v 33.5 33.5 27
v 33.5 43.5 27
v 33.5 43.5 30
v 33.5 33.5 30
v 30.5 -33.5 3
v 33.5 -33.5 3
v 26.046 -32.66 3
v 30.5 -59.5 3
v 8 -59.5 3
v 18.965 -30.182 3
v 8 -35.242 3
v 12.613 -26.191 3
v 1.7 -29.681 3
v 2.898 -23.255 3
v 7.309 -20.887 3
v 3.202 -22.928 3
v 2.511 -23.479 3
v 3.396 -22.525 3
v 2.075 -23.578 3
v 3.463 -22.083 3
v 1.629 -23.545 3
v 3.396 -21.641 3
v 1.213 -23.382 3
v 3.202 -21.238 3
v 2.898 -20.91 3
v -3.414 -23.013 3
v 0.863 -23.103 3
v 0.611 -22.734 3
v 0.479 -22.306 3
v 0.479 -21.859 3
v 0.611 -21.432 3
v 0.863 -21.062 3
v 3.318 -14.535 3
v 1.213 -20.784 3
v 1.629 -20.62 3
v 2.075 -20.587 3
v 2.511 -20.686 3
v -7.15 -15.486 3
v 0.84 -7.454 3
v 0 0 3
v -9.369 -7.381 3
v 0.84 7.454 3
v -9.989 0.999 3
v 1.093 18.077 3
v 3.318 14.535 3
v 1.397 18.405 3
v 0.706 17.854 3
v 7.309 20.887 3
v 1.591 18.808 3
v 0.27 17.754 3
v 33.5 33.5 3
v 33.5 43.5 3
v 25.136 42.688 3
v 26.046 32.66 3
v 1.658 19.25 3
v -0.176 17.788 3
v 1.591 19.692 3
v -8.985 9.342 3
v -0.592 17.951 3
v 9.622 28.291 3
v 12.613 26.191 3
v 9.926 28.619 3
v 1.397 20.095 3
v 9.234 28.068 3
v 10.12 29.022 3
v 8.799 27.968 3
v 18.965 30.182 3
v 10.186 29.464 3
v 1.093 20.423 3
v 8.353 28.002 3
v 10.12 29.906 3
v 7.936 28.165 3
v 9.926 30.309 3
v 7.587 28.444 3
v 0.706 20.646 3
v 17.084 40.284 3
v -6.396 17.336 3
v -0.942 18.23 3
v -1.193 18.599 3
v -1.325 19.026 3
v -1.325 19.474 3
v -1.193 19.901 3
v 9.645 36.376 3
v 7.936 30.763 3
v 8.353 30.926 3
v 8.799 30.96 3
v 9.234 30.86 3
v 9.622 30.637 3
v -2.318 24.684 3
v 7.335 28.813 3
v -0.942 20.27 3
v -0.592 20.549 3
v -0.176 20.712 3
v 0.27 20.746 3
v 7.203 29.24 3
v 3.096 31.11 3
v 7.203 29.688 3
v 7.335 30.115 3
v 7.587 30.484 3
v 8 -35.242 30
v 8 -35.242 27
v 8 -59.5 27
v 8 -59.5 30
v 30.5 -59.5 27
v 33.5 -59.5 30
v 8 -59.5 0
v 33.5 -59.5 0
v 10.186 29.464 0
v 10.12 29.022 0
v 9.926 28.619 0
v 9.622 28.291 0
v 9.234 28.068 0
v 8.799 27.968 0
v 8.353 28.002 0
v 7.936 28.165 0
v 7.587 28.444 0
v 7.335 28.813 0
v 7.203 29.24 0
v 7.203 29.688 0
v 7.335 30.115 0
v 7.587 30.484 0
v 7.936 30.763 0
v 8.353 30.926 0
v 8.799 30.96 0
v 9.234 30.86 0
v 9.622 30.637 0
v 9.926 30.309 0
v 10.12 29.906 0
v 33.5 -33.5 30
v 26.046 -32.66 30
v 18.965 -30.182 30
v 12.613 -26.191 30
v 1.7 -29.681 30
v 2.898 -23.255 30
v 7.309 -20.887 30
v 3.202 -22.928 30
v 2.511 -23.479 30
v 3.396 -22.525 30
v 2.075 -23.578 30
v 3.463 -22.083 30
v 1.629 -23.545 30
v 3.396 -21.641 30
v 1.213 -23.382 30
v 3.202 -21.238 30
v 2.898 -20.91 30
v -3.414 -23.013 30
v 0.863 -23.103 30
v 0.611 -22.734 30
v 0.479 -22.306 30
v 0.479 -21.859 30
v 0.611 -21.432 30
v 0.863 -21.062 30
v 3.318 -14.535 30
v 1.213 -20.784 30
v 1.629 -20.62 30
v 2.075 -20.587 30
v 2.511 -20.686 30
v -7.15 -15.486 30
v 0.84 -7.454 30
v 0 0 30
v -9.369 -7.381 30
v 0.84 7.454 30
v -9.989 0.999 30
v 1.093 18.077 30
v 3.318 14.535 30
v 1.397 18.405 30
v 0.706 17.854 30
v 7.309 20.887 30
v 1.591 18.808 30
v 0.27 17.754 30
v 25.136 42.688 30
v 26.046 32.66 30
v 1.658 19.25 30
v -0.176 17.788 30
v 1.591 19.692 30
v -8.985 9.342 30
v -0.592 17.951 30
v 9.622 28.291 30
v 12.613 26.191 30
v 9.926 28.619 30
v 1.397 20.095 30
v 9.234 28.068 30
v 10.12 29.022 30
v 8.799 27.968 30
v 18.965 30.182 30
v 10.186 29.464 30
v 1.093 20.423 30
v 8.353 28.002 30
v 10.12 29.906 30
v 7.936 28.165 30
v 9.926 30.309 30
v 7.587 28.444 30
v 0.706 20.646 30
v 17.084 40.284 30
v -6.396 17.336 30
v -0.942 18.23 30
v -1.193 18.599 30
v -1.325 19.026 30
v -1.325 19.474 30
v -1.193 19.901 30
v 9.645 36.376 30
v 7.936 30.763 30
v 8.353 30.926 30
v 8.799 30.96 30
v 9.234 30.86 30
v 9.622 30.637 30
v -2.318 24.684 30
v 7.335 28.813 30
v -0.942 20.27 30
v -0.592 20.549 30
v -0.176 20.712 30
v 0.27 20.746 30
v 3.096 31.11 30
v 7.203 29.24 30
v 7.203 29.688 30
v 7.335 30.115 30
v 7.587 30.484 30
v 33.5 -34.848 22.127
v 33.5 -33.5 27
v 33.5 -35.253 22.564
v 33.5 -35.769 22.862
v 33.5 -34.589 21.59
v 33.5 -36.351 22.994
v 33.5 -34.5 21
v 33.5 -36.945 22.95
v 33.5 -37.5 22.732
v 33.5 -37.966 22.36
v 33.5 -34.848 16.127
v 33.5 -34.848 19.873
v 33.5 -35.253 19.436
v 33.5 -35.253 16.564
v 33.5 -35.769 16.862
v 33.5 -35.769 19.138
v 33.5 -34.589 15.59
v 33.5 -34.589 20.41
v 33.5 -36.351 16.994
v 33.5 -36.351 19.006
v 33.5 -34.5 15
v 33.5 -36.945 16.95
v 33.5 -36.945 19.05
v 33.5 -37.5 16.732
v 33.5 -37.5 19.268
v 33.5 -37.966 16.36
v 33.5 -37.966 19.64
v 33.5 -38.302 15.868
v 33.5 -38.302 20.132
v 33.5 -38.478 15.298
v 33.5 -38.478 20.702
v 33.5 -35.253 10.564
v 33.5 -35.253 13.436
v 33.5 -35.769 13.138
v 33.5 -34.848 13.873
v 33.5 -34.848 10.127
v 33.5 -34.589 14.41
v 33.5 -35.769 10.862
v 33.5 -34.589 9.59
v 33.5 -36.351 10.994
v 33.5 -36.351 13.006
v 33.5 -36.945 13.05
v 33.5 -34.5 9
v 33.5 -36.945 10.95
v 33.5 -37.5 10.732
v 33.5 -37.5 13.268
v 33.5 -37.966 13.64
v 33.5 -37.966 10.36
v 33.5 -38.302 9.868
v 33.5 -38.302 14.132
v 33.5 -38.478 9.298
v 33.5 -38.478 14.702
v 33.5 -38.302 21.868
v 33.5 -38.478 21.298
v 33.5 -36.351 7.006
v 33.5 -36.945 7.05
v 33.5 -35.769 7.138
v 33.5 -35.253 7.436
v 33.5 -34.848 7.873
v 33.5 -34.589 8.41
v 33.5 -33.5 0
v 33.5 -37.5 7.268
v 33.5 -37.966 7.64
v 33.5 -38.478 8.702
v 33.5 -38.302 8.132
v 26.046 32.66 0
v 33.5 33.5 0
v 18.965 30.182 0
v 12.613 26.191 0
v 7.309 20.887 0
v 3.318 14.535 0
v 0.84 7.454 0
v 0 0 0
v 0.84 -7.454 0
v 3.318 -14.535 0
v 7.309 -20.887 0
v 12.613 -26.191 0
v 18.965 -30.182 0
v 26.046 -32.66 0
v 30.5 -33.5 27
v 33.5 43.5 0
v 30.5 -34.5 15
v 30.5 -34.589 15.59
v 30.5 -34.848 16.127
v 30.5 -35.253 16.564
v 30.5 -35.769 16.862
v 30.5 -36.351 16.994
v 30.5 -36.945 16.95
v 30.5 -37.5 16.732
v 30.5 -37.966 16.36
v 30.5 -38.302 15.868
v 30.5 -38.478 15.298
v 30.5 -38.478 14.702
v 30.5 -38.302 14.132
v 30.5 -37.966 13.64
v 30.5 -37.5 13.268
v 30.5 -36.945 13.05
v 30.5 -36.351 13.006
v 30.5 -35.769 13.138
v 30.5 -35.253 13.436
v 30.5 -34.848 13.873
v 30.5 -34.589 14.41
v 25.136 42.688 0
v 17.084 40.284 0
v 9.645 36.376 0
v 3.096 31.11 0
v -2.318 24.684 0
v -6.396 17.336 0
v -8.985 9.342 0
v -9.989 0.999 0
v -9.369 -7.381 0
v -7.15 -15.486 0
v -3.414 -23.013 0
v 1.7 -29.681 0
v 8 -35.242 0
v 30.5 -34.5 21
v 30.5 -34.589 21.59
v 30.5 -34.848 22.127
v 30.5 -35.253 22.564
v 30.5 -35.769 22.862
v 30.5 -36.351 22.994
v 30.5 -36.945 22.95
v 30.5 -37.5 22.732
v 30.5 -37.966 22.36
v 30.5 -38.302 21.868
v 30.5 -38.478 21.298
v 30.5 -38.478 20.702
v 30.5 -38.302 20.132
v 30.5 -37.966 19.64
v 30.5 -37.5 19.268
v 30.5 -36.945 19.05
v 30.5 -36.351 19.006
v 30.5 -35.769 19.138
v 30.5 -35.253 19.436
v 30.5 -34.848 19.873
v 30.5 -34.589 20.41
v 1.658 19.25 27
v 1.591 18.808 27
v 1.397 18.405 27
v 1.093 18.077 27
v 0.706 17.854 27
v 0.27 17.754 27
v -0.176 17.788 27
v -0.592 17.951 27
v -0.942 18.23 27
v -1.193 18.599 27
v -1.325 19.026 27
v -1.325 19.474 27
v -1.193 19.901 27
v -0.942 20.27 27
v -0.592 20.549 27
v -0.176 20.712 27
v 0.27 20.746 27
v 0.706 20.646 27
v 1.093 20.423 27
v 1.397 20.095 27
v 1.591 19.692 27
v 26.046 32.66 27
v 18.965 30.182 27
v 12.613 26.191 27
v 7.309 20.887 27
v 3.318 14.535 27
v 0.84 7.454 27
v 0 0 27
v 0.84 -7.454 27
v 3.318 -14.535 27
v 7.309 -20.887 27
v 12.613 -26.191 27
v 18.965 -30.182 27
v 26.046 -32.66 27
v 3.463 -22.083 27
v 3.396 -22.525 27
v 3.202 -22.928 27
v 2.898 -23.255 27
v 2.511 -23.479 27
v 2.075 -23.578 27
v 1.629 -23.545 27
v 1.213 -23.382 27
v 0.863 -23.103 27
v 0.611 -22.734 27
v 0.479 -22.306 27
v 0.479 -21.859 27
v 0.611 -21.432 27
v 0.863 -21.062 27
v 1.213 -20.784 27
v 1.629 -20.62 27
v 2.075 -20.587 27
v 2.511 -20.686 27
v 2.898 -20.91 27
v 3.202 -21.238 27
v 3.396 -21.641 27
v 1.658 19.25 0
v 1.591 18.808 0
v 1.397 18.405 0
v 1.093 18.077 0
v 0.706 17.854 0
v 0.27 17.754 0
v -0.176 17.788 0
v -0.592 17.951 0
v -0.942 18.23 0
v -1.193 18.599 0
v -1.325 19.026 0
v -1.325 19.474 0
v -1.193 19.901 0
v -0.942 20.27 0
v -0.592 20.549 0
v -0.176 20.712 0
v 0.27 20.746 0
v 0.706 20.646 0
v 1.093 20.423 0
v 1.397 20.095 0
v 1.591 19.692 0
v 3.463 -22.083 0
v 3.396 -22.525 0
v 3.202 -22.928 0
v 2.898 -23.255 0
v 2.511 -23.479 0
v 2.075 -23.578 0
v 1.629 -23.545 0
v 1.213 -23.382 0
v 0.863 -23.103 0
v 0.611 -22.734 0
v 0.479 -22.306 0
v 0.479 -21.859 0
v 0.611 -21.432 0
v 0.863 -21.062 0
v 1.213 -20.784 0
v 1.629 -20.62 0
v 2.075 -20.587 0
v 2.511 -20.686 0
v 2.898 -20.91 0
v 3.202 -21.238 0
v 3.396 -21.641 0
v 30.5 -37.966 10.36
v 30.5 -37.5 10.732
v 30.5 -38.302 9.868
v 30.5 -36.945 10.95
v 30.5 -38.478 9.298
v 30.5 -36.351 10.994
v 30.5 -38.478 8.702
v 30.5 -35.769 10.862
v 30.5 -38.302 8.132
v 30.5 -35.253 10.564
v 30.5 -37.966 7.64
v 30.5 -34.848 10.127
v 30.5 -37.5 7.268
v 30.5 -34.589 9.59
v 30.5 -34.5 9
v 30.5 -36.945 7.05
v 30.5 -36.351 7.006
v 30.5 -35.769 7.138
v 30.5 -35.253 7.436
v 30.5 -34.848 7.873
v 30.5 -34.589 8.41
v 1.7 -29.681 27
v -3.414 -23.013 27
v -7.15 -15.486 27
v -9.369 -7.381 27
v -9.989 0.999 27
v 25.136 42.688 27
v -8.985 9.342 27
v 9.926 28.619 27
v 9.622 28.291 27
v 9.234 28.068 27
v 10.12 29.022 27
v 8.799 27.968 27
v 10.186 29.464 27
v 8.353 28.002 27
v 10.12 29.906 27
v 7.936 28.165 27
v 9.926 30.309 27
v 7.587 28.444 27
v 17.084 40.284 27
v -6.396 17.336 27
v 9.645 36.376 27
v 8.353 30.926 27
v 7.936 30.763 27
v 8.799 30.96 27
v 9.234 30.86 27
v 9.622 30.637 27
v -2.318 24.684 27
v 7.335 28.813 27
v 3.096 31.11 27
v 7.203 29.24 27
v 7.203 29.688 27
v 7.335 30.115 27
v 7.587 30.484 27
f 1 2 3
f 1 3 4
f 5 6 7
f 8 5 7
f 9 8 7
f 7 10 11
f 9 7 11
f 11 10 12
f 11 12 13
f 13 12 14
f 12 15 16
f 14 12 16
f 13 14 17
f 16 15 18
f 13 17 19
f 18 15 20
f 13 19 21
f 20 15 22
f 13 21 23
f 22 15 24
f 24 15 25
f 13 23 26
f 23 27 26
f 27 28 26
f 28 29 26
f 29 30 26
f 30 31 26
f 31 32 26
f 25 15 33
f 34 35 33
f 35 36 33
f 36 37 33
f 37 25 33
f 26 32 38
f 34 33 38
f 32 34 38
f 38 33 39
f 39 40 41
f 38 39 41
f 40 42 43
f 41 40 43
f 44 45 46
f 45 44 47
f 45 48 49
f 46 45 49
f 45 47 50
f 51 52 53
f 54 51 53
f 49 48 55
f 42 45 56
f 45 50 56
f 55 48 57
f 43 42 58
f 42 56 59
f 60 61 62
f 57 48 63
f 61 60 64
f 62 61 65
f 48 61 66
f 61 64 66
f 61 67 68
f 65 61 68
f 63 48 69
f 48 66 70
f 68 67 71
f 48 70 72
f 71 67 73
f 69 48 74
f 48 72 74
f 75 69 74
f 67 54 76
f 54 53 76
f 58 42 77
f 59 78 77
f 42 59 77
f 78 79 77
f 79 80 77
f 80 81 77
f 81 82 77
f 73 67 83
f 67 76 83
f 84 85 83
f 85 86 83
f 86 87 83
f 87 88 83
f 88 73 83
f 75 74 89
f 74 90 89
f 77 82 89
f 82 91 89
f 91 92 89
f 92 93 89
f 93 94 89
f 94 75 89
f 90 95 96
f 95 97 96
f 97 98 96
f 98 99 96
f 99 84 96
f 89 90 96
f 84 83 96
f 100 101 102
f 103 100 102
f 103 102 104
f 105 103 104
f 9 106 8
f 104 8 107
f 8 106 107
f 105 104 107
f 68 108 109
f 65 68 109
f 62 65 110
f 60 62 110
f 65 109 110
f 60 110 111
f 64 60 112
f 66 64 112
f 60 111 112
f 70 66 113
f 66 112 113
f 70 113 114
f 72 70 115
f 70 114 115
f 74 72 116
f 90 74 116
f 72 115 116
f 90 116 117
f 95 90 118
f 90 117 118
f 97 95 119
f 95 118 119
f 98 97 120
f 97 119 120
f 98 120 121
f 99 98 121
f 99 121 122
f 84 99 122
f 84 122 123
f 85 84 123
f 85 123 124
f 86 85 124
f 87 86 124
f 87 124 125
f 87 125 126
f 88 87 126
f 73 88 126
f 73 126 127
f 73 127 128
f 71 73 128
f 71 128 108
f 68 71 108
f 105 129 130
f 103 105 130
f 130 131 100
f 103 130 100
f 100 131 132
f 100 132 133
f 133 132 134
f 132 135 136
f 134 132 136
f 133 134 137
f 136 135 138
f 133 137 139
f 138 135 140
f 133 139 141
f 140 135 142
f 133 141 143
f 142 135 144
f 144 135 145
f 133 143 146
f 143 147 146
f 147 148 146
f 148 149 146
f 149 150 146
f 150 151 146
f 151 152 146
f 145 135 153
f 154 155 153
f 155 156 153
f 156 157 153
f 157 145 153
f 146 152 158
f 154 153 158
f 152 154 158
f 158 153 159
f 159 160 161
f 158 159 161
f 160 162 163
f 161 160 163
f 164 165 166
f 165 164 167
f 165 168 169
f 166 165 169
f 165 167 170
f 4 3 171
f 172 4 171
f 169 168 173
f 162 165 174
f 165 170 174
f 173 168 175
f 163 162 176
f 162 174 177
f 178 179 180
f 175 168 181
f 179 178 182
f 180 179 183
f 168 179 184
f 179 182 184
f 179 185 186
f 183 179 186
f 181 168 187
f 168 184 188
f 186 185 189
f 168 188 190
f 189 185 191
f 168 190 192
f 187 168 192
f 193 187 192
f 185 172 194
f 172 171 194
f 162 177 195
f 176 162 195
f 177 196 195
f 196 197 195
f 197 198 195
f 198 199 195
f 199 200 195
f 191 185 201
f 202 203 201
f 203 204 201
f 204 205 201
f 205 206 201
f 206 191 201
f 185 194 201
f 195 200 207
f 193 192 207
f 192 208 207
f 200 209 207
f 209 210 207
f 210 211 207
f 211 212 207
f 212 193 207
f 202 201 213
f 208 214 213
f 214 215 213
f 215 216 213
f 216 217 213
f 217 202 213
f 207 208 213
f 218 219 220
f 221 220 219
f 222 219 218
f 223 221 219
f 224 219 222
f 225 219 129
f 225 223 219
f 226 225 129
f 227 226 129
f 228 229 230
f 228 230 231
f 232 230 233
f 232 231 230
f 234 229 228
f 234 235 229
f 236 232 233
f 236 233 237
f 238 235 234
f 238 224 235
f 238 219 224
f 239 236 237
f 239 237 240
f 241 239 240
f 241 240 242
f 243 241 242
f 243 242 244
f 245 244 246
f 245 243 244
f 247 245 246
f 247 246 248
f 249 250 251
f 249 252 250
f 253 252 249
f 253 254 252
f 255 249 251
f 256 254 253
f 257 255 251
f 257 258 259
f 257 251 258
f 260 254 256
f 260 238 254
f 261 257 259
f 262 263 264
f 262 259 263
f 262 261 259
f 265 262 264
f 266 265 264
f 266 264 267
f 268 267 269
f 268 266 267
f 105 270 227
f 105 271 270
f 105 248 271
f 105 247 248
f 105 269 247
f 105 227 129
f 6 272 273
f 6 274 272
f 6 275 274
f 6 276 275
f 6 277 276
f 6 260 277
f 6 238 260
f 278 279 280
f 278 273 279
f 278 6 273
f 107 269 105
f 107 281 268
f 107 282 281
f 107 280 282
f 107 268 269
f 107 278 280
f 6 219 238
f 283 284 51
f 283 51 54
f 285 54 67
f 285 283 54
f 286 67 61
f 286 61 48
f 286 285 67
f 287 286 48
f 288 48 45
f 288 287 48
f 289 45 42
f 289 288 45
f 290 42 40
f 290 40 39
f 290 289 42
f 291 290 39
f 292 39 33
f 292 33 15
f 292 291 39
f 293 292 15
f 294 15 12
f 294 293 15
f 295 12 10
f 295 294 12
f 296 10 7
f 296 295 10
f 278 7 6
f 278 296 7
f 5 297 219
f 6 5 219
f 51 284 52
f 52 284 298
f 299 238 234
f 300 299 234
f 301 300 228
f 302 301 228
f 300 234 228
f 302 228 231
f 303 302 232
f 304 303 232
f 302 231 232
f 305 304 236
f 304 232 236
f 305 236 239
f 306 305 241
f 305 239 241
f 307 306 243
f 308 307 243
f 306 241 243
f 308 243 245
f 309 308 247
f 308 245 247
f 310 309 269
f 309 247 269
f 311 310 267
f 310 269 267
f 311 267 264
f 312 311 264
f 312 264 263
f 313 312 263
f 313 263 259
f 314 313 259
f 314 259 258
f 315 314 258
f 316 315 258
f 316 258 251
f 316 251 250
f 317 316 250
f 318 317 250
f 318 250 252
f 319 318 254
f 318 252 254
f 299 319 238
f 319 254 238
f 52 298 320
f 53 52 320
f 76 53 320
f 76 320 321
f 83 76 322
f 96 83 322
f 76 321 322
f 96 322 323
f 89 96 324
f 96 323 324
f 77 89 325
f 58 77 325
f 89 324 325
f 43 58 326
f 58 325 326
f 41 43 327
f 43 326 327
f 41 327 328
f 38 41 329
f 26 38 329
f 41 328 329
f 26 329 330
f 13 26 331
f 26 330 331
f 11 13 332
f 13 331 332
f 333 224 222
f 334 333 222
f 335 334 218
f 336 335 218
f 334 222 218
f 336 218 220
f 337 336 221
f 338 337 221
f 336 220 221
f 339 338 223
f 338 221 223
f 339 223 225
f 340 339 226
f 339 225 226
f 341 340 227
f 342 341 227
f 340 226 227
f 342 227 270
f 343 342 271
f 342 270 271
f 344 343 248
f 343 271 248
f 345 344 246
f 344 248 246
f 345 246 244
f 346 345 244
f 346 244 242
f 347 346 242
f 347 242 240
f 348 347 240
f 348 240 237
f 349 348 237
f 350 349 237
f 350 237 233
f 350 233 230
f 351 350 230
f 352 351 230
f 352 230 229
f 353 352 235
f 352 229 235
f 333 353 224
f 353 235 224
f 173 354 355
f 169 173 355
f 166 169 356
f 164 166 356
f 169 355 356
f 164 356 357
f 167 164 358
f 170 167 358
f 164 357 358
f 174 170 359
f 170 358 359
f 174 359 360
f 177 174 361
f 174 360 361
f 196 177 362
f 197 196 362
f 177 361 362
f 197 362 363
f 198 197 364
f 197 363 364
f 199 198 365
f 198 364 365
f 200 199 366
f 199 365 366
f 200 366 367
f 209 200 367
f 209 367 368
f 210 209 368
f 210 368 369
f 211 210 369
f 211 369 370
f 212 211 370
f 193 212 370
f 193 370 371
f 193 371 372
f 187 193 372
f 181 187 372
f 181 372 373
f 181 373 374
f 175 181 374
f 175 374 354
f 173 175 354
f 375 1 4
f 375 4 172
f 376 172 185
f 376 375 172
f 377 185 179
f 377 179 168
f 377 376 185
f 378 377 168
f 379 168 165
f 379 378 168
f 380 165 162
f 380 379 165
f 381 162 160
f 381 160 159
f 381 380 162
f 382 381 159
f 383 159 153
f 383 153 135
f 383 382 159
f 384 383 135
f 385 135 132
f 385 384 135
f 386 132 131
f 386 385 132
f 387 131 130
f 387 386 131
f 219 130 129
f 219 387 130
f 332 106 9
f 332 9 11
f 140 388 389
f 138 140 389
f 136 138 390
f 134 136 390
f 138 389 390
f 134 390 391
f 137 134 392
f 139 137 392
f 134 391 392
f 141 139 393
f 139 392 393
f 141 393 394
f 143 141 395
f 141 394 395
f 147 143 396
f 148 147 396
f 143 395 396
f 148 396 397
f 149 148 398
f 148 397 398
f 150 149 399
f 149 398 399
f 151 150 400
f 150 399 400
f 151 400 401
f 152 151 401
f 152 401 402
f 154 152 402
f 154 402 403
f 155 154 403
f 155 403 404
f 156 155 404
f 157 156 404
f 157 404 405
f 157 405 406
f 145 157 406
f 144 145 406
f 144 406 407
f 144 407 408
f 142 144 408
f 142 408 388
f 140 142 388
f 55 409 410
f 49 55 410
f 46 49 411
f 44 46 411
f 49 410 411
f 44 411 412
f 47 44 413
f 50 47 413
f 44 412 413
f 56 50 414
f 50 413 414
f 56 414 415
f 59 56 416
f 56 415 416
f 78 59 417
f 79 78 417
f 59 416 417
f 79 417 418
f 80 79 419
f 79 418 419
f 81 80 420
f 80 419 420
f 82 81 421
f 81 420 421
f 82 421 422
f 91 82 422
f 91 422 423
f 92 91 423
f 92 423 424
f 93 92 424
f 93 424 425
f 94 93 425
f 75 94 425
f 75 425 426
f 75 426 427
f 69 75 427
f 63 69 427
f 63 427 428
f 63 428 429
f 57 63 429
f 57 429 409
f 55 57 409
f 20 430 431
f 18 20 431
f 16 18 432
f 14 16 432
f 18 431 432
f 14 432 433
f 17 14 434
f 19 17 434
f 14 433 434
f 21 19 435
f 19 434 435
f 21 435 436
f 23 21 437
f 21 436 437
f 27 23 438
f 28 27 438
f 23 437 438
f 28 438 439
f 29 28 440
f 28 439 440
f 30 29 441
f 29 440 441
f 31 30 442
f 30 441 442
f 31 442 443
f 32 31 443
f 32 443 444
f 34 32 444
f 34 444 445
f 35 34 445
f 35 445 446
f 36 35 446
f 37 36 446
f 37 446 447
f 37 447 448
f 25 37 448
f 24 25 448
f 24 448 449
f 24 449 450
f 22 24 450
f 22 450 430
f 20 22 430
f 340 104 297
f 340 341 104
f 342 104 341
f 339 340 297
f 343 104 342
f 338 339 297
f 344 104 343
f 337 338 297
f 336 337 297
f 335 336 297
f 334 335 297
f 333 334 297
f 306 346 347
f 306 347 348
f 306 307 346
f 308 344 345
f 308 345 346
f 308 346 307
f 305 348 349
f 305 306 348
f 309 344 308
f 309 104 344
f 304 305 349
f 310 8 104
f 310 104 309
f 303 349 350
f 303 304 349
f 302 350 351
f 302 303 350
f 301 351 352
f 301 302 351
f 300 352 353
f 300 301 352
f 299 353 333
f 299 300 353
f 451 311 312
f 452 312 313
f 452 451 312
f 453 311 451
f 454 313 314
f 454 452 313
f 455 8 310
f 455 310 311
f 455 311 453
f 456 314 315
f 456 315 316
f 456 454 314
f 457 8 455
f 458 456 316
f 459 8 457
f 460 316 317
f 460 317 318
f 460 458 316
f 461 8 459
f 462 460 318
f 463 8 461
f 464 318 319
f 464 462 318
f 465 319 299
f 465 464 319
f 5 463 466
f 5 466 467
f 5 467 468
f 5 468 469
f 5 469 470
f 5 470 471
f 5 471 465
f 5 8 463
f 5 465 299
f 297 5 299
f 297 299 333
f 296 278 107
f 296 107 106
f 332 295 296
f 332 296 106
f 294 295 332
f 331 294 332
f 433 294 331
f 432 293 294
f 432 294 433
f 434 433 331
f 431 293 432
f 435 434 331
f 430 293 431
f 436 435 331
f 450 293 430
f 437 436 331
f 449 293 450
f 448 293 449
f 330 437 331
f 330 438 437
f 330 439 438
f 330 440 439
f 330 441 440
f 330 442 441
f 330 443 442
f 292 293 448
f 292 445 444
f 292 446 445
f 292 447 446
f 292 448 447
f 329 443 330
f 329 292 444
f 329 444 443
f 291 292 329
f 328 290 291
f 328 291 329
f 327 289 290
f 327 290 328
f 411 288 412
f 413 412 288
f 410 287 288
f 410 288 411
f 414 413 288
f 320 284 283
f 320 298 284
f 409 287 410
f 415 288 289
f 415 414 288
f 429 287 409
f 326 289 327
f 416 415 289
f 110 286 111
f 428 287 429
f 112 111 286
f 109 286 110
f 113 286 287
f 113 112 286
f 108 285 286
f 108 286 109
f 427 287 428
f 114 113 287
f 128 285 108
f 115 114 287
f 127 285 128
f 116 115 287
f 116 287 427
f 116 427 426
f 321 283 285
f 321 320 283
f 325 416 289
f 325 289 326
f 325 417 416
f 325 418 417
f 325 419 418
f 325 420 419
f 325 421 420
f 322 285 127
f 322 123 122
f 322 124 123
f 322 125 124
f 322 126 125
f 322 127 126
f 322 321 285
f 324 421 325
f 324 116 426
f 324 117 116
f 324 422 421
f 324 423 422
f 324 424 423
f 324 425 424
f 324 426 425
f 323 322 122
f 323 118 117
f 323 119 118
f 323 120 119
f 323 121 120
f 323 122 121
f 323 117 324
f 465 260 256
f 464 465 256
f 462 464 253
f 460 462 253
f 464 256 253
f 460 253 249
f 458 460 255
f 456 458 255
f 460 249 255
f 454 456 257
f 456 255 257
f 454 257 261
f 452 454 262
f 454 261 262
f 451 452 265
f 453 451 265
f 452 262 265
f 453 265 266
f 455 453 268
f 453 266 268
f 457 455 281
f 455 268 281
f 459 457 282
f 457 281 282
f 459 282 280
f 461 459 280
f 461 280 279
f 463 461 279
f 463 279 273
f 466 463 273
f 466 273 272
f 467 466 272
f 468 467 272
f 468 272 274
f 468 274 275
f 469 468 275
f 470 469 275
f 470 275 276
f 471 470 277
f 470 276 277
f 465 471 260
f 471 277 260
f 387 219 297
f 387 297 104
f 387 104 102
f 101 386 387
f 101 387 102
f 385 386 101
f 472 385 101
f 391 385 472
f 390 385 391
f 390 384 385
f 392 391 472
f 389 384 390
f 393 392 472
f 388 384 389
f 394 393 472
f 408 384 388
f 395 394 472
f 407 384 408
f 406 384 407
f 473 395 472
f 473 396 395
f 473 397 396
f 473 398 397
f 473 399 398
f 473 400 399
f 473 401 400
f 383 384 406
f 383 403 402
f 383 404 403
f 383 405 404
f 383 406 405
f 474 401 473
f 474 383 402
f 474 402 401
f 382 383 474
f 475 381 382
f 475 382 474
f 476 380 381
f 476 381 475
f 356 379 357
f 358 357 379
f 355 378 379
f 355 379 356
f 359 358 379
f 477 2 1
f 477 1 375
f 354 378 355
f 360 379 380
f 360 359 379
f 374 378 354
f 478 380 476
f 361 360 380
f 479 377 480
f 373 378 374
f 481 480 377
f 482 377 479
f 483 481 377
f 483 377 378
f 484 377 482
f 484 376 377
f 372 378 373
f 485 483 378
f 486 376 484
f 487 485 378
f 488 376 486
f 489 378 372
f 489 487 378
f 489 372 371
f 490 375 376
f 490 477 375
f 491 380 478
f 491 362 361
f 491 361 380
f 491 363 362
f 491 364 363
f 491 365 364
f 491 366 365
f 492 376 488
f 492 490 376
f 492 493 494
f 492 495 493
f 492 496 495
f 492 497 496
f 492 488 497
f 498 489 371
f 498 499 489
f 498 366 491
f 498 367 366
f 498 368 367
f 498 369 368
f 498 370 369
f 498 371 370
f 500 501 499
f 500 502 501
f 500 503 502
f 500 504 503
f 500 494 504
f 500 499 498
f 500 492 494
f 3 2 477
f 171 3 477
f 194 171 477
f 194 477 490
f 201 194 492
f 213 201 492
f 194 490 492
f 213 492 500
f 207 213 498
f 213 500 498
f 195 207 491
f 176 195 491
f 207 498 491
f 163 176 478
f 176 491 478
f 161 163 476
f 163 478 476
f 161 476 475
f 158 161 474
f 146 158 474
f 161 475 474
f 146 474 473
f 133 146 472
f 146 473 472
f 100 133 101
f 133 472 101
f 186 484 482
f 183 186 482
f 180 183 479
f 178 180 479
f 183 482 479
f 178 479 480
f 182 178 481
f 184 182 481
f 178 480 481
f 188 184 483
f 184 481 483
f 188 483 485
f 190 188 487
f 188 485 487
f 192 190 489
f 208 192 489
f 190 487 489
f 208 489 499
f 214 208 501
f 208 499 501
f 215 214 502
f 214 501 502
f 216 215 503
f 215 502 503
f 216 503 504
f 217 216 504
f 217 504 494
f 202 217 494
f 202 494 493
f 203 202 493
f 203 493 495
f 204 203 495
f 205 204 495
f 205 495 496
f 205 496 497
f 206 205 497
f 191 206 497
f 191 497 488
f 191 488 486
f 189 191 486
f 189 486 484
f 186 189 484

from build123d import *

# Parameters (mm, degrees)
PAD_DEPTH       = 3
SKETCH001_W     = 3
SKETCH001_H     = 26
PAD001_DEPTH    = 24
SKETCH002_R     = 2
POCKET_DEPTH    = 3
PAD002_DEPTH    = 3
SKETCH004_R     = 1.5
POCKET001_DEPTH = 30.001


with BuildPart() as part:
    # Sketch → Pad (new body)
    with BuildSketch(Plane.XY):
        with BuildLine():
            ThreePointArc((33.5, 33.5), (0, 0), (33.5, -33.5))
            Line((33.5, -33.5), (33.5, -59.5))
            Line((33.5, -59.5), (8, -59.5))
            Line((8, -59.5), (8, -35.24202))
            ThreePointArc((33.5, 43.5), (-7.884042, 13.401905), (8, -35.24202))
            Line((33.5, 33.5), (33.5, 43.5))
        make_face()
    extrude(amount=PAD_DEPTH)

    # Sketch001 → Pad001 (new body)
    with BuildSketch(Plane.XY.offset(3)):
        with Locations((32, -46.5)):
            Rectangle(SKETCH001_W, SKETCH001_H)
    extrude(amount=PAD001_DEPTH)

    # Sketch002 → Pocket (cut)
    with BuildSketch(Plane.YZ.offset(33.5)):
        with Locations((-36.5, 21)):
            Circle(SKETCH002_R)
        with Locations((-36.5, 15)):
            Circle(SKETCH002_R)
        with Locations((-36.5, 9)):
            Circle(SKETCH002_R)
    extrude(amount=-POCKET_DEPTH, mode=Mode.SUBTRACT)

    # Sketch003 → Pad002 (new body)
    with BuildSketch(Plane.XY.offset(27)):
        with BuildLine():
            Line((33.5, 43.5), (33.5, 33.5))
            ThreePointArc((33.5, 33.5), (0, 0), (33.5, -33.5))
            Line((33.5, -33.5), (33.5, -59.5))
            Line((8, -59.5), (33.5, -59.5))
            Line((8, -35.24202), (8, -59.5))
            ThreePointArc((33.5, 43.5), (-7.884042, 13.401905), (8, -35.24202))
        make_face()
    extrude(amount=PAD002_DEPTH)

    # Sketch004 → Pocket001 (cut, through all)
    with BuildSketch(Plane(origin=(0, 0, 0), x_dir=(1, 0, 0), z_dir=(0, 0, -1))):
        with Locations((1.962646, 22.082693)):
            Circle(SKETCH004_R)
        with Locations((8.68646, -29.464001)):
            Circle(SKETCH004_R)
        with Locations((0.158022, -19.25)):
            Circle(SKETCH004_R)
    extrude(amount=-POCKET001_DEPTH, mode=Mode.SUBTRACT)


solid = part.part
